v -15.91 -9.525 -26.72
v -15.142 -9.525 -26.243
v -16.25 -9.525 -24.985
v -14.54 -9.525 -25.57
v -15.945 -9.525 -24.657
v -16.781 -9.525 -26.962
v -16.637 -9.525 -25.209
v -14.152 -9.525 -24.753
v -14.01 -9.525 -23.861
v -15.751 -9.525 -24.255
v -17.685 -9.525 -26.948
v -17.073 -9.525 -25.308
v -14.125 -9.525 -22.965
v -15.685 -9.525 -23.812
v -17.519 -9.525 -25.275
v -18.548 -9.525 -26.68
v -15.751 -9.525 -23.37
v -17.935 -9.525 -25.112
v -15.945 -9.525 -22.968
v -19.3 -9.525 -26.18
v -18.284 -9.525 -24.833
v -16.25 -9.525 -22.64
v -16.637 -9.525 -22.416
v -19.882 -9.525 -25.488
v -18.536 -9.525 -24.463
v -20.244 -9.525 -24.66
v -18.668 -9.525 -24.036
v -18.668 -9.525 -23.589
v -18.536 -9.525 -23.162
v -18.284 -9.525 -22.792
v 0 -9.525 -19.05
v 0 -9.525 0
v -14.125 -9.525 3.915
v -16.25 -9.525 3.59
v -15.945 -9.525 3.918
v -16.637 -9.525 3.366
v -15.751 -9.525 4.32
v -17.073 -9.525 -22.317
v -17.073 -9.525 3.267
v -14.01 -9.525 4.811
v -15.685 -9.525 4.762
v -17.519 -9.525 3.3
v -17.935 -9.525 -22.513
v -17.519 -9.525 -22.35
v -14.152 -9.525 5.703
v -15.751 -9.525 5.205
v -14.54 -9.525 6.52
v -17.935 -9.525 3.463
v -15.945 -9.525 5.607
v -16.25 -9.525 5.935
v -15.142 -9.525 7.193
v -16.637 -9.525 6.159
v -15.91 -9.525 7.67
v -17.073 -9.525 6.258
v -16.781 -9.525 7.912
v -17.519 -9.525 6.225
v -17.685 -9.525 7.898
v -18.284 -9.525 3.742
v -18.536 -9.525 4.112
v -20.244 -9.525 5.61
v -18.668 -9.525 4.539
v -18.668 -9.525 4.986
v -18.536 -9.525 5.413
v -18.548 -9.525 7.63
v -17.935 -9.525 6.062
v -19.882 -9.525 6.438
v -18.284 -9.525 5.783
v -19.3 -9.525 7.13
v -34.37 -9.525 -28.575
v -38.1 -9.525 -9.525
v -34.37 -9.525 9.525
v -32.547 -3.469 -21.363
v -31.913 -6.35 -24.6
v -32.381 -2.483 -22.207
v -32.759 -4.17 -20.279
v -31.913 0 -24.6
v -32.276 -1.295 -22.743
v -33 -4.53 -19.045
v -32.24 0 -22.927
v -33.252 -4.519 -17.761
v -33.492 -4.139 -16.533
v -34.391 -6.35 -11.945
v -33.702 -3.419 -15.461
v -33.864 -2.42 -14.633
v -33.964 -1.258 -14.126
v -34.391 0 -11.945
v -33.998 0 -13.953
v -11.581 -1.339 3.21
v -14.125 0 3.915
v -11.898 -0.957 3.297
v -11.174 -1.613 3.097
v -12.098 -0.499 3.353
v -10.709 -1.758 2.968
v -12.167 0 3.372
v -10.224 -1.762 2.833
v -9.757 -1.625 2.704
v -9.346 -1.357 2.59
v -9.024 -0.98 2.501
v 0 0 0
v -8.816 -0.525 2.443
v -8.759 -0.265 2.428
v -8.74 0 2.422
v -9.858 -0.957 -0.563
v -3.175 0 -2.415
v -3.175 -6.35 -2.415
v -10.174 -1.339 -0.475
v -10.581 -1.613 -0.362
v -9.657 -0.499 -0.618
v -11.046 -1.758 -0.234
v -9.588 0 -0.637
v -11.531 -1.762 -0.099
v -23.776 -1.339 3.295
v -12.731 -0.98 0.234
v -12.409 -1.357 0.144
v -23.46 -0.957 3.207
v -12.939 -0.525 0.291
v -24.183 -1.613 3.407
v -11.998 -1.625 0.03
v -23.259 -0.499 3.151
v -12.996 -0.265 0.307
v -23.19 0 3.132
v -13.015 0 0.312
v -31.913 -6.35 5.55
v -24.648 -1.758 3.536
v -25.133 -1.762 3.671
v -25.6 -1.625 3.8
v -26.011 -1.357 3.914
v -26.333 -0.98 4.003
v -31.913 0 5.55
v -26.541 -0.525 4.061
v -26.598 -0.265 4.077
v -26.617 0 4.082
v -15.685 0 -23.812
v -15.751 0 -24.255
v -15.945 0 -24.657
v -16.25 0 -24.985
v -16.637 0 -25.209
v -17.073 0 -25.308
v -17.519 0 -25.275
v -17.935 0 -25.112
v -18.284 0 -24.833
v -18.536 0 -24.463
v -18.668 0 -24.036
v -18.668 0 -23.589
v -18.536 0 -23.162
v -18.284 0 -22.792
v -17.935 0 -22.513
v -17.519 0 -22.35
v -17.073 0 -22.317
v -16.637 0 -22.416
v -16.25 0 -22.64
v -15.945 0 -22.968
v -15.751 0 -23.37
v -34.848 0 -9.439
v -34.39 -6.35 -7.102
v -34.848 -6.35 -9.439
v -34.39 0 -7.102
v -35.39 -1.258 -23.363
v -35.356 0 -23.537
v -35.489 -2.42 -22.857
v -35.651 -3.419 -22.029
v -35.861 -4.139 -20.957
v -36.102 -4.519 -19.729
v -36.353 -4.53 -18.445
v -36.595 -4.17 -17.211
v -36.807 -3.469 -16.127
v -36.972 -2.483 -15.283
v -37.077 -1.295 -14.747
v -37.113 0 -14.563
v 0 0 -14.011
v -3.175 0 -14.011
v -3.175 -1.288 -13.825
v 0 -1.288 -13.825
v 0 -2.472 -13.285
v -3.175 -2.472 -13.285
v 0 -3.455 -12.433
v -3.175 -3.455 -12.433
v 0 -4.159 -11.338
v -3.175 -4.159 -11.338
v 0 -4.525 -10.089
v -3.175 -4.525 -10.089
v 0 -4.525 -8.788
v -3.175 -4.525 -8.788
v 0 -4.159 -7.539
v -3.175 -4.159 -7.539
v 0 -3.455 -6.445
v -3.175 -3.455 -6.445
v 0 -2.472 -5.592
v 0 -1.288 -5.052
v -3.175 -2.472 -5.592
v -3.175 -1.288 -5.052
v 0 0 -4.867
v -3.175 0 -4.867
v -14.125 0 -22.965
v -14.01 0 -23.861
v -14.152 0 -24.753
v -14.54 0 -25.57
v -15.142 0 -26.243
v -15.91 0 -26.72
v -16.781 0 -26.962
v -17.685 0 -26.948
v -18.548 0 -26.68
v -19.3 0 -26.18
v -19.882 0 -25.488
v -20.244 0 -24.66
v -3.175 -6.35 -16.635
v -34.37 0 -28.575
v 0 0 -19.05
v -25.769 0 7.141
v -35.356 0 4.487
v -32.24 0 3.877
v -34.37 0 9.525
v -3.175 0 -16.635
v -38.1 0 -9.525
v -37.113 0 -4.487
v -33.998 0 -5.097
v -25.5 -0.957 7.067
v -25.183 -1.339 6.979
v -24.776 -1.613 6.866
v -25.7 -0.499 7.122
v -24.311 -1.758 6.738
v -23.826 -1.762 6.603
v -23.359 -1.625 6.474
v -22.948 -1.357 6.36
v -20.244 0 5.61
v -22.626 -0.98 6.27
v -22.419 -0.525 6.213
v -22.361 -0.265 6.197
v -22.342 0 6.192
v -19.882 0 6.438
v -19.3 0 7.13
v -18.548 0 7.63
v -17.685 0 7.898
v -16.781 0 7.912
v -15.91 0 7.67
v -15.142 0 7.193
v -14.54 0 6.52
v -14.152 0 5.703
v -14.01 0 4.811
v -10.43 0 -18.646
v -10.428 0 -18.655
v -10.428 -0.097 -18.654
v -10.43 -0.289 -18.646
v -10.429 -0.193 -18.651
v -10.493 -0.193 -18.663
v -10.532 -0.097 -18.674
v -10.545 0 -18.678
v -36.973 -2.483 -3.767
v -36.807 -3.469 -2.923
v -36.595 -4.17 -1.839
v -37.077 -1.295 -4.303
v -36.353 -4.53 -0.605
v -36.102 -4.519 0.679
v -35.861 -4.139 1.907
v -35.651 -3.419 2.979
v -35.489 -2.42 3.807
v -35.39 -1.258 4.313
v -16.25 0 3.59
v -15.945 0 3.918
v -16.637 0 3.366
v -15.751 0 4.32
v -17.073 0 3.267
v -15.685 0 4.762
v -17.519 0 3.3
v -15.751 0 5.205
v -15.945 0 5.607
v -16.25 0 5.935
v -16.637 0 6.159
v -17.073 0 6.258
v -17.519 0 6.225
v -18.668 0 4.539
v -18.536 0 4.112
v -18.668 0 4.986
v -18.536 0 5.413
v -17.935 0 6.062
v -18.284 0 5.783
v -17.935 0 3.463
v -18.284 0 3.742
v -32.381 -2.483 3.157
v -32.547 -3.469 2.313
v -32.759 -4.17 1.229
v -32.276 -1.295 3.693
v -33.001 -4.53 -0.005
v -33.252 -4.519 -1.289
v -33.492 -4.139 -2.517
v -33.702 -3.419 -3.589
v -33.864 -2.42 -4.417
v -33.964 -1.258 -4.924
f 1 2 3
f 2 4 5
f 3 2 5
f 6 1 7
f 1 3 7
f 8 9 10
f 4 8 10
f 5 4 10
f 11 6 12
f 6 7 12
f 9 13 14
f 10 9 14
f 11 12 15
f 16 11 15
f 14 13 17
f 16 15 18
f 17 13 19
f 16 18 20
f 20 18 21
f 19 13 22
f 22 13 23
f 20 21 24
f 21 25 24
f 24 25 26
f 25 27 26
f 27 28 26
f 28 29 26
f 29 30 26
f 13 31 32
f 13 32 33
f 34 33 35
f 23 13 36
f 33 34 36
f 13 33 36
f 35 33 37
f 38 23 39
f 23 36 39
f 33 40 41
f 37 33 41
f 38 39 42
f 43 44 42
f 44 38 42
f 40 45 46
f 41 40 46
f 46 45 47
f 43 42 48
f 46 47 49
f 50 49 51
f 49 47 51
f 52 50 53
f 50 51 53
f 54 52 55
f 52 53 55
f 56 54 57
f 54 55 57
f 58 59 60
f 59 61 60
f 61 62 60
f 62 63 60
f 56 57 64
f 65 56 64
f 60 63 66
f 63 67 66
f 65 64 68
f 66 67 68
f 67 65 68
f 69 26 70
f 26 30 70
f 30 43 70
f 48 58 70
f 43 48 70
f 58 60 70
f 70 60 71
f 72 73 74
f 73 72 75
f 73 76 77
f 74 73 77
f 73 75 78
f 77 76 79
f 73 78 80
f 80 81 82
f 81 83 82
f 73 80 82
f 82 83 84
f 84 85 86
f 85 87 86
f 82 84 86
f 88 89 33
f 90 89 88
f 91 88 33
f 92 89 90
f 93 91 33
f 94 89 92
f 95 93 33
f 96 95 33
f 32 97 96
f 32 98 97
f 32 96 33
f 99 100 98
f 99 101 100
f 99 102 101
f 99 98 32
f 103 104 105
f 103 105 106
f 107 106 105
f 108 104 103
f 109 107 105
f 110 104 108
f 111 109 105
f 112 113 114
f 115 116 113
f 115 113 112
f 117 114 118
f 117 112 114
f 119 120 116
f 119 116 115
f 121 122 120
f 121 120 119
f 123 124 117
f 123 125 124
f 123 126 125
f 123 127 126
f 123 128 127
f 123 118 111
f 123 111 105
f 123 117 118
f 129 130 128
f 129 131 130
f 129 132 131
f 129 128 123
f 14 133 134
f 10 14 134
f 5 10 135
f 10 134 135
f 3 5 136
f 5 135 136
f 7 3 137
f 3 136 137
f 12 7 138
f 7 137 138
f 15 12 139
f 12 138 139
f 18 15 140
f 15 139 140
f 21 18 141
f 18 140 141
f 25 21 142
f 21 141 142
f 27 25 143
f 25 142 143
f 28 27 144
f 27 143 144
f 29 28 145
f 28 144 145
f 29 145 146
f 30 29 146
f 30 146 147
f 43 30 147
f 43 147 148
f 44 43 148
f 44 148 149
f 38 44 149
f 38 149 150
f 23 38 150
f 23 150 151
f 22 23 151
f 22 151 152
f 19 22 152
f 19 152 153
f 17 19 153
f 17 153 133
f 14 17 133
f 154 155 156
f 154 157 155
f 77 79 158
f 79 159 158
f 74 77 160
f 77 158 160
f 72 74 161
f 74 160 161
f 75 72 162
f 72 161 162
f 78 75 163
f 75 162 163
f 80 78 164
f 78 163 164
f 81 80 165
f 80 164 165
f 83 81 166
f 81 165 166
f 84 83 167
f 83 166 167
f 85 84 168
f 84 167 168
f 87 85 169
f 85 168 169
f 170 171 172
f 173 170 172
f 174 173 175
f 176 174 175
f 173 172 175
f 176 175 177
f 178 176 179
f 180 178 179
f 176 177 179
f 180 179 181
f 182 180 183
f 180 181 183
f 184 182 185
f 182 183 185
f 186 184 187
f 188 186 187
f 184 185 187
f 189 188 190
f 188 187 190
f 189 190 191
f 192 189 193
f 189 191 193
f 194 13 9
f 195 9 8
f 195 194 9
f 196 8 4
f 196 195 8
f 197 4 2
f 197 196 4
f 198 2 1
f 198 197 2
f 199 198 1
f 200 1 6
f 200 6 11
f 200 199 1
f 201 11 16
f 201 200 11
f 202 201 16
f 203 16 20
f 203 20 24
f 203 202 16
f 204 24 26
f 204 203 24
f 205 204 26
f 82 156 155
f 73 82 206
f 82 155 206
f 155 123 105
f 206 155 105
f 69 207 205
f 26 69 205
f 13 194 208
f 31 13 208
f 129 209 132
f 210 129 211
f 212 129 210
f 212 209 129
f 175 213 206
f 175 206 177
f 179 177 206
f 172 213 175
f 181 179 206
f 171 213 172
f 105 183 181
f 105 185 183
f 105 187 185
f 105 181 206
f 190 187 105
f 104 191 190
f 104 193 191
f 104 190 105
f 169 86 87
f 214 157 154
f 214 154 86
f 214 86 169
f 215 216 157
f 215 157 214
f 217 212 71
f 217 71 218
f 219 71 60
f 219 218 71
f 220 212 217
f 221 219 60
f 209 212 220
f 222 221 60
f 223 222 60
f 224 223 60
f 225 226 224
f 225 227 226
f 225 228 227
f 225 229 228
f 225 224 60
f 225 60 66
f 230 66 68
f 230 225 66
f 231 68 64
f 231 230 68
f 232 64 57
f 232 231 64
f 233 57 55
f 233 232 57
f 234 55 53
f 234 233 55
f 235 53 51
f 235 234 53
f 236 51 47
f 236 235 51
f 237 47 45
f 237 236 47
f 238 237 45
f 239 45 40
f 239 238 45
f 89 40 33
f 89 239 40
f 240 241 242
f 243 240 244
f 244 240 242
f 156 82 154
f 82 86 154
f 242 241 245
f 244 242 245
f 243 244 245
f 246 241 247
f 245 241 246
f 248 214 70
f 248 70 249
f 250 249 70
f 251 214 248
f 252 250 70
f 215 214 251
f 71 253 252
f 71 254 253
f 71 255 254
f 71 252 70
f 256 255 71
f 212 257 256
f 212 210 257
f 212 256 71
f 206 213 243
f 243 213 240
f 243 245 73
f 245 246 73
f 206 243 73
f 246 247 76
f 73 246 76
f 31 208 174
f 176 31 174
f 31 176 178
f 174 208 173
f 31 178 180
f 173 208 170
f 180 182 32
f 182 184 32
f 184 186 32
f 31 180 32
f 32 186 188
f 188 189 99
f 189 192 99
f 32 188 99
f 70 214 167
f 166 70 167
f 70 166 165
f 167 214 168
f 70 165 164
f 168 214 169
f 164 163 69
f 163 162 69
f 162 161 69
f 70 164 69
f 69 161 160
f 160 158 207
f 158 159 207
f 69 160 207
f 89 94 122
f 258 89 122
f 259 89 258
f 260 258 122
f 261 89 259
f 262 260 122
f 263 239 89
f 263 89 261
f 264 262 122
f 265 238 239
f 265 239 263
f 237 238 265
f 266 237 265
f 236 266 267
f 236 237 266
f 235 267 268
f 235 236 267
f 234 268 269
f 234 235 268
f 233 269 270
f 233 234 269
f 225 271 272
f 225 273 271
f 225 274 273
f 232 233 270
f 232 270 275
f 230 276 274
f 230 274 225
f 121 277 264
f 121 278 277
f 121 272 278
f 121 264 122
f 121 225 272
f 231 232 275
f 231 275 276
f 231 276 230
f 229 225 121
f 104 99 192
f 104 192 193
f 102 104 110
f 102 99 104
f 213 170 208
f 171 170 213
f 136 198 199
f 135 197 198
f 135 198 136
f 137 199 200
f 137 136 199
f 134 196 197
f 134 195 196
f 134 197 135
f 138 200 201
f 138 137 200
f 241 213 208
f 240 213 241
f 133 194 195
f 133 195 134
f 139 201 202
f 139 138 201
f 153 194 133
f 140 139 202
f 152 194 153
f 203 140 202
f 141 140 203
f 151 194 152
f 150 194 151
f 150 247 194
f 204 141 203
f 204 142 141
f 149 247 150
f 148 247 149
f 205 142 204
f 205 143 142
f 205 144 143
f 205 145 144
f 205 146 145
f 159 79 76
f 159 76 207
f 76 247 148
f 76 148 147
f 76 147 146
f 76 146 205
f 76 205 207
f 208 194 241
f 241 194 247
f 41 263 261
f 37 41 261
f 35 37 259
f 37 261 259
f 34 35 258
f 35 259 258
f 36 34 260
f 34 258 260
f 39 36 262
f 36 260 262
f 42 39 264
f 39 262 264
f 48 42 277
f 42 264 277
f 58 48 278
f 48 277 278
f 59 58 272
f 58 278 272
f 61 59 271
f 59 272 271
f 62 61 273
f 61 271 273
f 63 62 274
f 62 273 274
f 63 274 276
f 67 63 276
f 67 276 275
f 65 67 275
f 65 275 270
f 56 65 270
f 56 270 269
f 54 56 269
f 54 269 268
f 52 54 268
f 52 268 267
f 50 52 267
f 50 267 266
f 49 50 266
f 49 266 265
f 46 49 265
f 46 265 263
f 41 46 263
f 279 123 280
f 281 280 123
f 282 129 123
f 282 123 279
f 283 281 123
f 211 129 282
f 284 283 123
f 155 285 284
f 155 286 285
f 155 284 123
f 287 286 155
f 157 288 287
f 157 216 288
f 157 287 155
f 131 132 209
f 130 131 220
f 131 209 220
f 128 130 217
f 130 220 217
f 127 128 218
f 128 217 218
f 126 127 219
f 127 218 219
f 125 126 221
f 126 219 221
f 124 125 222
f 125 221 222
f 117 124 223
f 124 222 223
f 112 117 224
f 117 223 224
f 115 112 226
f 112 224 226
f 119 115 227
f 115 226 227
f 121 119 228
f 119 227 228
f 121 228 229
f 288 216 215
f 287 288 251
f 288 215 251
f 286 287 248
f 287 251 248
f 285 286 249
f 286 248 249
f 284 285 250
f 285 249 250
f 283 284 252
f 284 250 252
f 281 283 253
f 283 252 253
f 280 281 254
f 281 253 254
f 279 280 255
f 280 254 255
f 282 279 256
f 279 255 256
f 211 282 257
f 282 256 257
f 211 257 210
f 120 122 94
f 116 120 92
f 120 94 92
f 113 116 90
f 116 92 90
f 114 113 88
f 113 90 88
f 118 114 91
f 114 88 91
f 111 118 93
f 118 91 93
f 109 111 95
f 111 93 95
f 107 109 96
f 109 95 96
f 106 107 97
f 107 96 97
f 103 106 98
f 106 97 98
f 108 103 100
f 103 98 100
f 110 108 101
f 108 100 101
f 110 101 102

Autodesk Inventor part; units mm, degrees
ref_plane "YZ Plane" through (0, 0, 0) normal (1, 0, 0) x (0, 1, 0)
ref_plane "XZ Plane" through (0, 0, 0) normal (0, 1, 0) x (-1, 0, 0)
ref_plane "XY Plane" through (0, 0, 0) normal (0, 0, 1) x (1, 0, 0)
sketch "Sketch1" plane through (0, 0, 0) normal (0, 1, 0) x (-1, 0, 0)
  line L0 (0, 0) -> (25.4, 0)
  line L1 (25.4, 0) -> (25.4, -19.05)
  line L2 (25.4, -19.05) -> (0, -19.05)
  line L3 (0, -19.05) -> (0, 0)
  line L4 (25.4, -9.525) -> (38.1, -9.525)
  line L5 (38.1, -9.525) -> (34.3696, 9.525)
  line L6 (34.3696, 9.525) -> (0, 0)
  line L7 (38.1, -9.525) -> (34.3696, -28.575)
  line L8 (34.3696, -28.575) -> (0, -19.05)
  line L9 (-0.8514, -15.5194) -> (31.9128, -24.5995)
  line L10 (31.9128, -24.5995) -> (34.3908, -11.9449)
  line L11 (1.5358, -2.8691) -> (31.9128, 5.5495)
  line L12 (31.9128, 5.5495) -> (34.3903, -7.1024)
  line L13 (3.175, -19.05) -> (3.175, -6.35)
  line L14 (34.3908, -11.9449) -> (38.1, 8.3994)
  line L15 (34.3903, -7.1024) -> (39.9584, -35.5367)
  line L16 (3.175, -6.35) -> (3.175, -2.4148)
  point P0 (3.175, -19.05)
  point P1 (3.175, 0)
  point P2 (11.8883, 0)
  point P3 (34.7909, -6.35)
  point P4 (11.8883, -19.05)
  point P5 (3.175, -16.6352)
  point P6 (3.175, -2.6421)
  point P7 (0, -15.7553)
  point P8 (34.8478, -9.4386)
  dimension "d0" = 25.4
  dimension "d1" = 19.05
  dimension "d2" = 12.7
  dimension "d3" = 19.05
  dimension "d4" = 3.175
  dimension "d5" = 3.175
  dimension "d6" = 3.175
extrude "Extrusion1" add sketch "Sketch1" against normal blind 9.525 contours L6 L5 L14 L15 L12 L11 L0 | L0 L11 L16 L13 L9 L3 | L9 L13 L2 L3 | L2 L9 L10 L14 L4 L15 L7 L8 | L9 L2 L13 | L5 L4 L15 L14 | L7 L15 L4 | L15 L4 L14
sketch "Sketch3" plane through (-38.1, -9.525, -9.525) normal (-0.9814, 0, 0.1922) x (0.1922, 0, 0.9814)
  line L0 (0, 9.525) -> (19.4118, 9.525) projected
  circle A0 centre (9.7059, 9.525) radius 4.572
  point P0 (16.6692, 9.525)
  point P1 (14.2779, 9.525)
  point P2 (5.1339, 9.525)
  dimension "d12" = 9.144
extrude "Extrusion3" cut sketch "Sketch3" against normal blind 25.4 contours L0 A0 picked at (10.7462, 7.5625)
sketch "Sketch4" plane through (-34.3696, -9.525, -28.575) normal (-0.9814, 0, -0.1922) x (-0.1922, 0, 0.9814)
  line L0 (0, 9.525) -> (19.4118, 9.525) projected
  circle A0 centre (9.7059, 9.525) radius 4.572
  point P0 (21.4375, 9.525)
  point P1 (14.2779, 9.525)
  point P2 (5.1339, 9.525)
  dimension "d15" = 9.144
extrude "Extrusion4" cut sketch "Sketch4" against normal blind 25.4 contours L0 A0 picked at (10.7462, 7.5625)
sketch "Sketch5" plane through (-3.175, 0, -16.6352) normal (-1, 0, 0) x (0, 0, 1)
  line L0 (7.1966, 0) -> (4.6903, 0) projected
  circle A0 centre (7.1966, 0) radius 4.572
  point P0 (16.6352, 0)
  dimension "d18" = 9.144
extrude "Extrusion5" cut sketch "Sketch5" against normal blind 9.525
sketch "Sketch6" plane through (0, -9.525, 0) normal (0, -1, 0) x (1, 0, 0)
  line L0 (-34.3696, -28.575) -> (0, -19.05) projected
  line L1 (0, -19.05) -> (0, 0) projected
  line L2 (0, 0) -> (-34.3696, 9.525) projected
  line L3 (-34.3696, 9.525) -> (-38.1, -9.525) projected
  line L4 (-38.1, -9.525) -> (-34.3696, -28.575) projected
  line L5 (-3.175, -2.4148) -> (-3.175, -16.6352) projected
  line L6 (-3.175, -16.6352) -> (-31.9128, -24.5995) projected
  line L7 (-31.9128, -24.5995) -> (-34.3908, -11.9449) projected
  line L8 (-34.3908, -11.9449) -> (-34.8478, -9.4386) projected
  line L9 (-34.8478, -9.4386) -> (-31.9128, 5.5495) projected
  line L10 (-31.9128, 5.5495) -> (-3.175, -2.4148) projected
extrude "Extrusion6" add sketch "Sketch6" against normal blind 3.175 contours L4 L3 L2 L1 L0 | L5 L6 L7 L8 L9 L10
sketch "Sketch7" plane through (0, 0, 0) normal (0, 1, 0) x (1, 0, 0)
  line L0 (-34.3696, -9.525) -> (0, 0) projected
  circle A0 centre (-17.1848, -4.7625) radius 3.175
  line L1 (-10.5511, 0.3706) -> (-31.9128, -5.5495) projected
  line L2 (-34.3696, 28.575) -> (0, 19.05) projected
  circle A1 centre (-17.1848, 23.8125) radius 3.175
  line L3 (-31.9128, 24.5995) -> (-10.5511, 18.6794) projected
  point P0 (-20.2445, 24.6604)
  point P1 (-14.1251, 22.9646)
  point P2 (-14.1251, -3.9146)
  point P3 (-20.2445, -5.6104)
extrude "Extrusion7" add sketch "Sketch7" against normal blind 9.525 contours L0 A0 | A1 L2 picked at (-16.7975, -6.2491) picked at (-16.3793, 25.0421)
sketch "Sketch8" plane through (0, 0, 0) normal (0, 1, 0) x (1, 0, 0)
  arc A0 (-14.1251, 22.9646) -> (-20.2445, 24.6604) centre (-17.1848, 23.8125) ccw projected
  circle A1 centre (-17.1848, 23.8125) radius 1.5
  arc A2 (-20.2445, -5.6104) -> (-14.1251, -3.9146) centre (-17.1848, -4.7625) ccw projected
  circle A3 centre (-17.1848, -4.7625) radius 1.5
  point P0 (0, 0)
  dimension "d25" = 3
  dimension "d26" = 3
extrude "Extrusion8" cut sketch "Sketch8" against normal blind 9.525
sketch "Sketch10" plane through (-34.3696, -9.525, 9.525) normal (0.2671, 0, 0.9637) x (0.9637, 0, -0.2671)
  line L0 (25.5962, 9.525) -> (3.4293, 9.525) projected
  circle A0 centre (10.7027, 9.525) radius 1.778
  circle A1 centre (24.8175, 9.525) radius 1.778
  line L1 (21.0075, 9.525) -> (21.0075, 0) projected
  point P0 (35.665, 9.525)
  point P1 (14.5127, 9.525)
  point P2 (8.9247, 9.525)
  point P3 (12.4807, 9.525)
  dimension "d29" = 3.556
  dimension "d30" = 3.556
  dimension "d31" = 3.81
  dimension "d32" = 3.81
extrude "Extrusion9" cut sketch "Sketch10" against normal blind 9.525 contours A0 L0 | A1 picked at (11.0394, 9.0372)
properties part number "powerFromBatterySplitHousing"
